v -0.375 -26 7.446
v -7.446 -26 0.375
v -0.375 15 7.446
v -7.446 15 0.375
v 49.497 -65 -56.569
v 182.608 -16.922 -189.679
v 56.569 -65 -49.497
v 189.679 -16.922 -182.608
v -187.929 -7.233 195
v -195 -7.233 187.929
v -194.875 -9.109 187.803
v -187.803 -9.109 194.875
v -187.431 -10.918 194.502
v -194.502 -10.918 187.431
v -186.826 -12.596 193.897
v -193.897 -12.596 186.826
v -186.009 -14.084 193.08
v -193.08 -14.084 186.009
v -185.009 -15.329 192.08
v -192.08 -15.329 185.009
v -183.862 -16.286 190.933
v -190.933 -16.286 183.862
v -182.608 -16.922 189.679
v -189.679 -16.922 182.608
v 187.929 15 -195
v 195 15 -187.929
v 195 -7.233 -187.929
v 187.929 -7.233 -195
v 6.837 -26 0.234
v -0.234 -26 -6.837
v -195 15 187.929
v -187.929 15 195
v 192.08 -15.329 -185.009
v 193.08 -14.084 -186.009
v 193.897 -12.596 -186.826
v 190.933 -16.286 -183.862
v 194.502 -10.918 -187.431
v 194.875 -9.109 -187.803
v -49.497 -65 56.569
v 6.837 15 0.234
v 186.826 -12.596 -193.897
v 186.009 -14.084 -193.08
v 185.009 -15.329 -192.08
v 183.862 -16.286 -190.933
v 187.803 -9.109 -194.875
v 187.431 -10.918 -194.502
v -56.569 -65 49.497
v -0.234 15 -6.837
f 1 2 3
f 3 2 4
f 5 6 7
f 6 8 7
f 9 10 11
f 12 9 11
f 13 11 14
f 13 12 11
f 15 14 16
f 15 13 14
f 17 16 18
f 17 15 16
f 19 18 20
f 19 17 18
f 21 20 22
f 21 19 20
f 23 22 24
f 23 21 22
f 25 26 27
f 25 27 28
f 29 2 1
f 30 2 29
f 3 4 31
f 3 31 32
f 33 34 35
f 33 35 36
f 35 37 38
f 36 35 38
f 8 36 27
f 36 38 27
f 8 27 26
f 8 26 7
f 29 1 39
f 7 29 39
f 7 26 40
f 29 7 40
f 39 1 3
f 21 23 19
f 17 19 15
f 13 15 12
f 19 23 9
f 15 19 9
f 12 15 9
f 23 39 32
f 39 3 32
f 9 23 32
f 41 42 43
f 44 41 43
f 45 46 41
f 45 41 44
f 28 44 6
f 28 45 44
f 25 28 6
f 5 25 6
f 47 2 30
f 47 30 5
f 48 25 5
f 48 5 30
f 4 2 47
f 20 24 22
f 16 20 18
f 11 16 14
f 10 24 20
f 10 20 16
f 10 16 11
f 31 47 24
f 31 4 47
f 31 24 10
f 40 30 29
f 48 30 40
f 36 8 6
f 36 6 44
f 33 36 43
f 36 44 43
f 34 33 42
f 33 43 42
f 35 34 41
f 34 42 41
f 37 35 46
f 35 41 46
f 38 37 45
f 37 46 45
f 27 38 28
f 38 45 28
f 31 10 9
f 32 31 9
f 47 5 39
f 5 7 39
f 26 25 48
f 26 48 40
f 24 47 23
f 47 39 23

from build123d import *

# Parameters (mm, degrees)
BOSS_EXTRUDE1_DEPTH     = 15
BOSS_EXTRUDE2_DEPTH     = 5
CUT_EXTRUDE2_DEPTH      = 284.32843133
CUT_EXTRUDE2_DEPTH_BACK = 284.32843133
SKETCH4_W               = 10.2
SKETCH4_H               = 82
FILLET1_R               = 10


with BuildPart() as part:
    # Sketch1 → Boss-Extrude1 (new, symmetric)
    with BuildSketch(Plane(origin=(0, 0, 0), x_dir=(1, 0, 0), z_dir=(0, 1, 0))):
        Polygon((-195, -187.928932188), (-187.928932188, -195), (195, 187.928932188), (187.928932188, 195), align=None)
    extrude(amount=BOSS_EXTRUDE1_DEPTH, both=True)

    # Sketch3 → Boss-Extrude2 (add, symmetric)
    with BuildSketch(Plane(origin=(0, 0, 0), x_dir=(0.7071067811865476, 0, -0.7071067811865476), z_dir=(0.7071067811865476, 0, 0.7071067811865476))):
        Polygon((270.771644663, -15), (75, -65), (-75, -65), (-270.771644663, -15), align=None)
    extrude(amount=BOSS_EXTRUDE2_DEPTH, both=True)

    # Sketch4 → Cut-Extrude2 (cut, two sides: drawn at the far end of the back side and taken through both)
    with BuildSketch(Plane(origin=(0, 0, 0), x_dir=(0.7071067811865476, 0, -0.7071067811865476), z_dir=(0.7071067811865476, 0, 0.7071067811865476)).offset(-CUT_EXTRUDE2_DEPTH_BACK)):
        with Locations((-0.430935361, 15)):
            Rectangle(SKETCH4_W, SKETCH4_H)
    extrude(amount=CUT_EXTRUDE2_DEPTH + CUT_EXTRUDE2_DEPTH_BACK, mode=Mode.SUBTRACT)

    # Fillet1
    fillet1_edges = [part.edges().sort_by_distance(p)[0] for p in [
        (191.464466094, -15, -191.464466094),
        (-191.464466094, -15, 191.464466094),
    ]]
    fillet(fillet1_edges, radius=FILLET1_R)


solid = part.part
